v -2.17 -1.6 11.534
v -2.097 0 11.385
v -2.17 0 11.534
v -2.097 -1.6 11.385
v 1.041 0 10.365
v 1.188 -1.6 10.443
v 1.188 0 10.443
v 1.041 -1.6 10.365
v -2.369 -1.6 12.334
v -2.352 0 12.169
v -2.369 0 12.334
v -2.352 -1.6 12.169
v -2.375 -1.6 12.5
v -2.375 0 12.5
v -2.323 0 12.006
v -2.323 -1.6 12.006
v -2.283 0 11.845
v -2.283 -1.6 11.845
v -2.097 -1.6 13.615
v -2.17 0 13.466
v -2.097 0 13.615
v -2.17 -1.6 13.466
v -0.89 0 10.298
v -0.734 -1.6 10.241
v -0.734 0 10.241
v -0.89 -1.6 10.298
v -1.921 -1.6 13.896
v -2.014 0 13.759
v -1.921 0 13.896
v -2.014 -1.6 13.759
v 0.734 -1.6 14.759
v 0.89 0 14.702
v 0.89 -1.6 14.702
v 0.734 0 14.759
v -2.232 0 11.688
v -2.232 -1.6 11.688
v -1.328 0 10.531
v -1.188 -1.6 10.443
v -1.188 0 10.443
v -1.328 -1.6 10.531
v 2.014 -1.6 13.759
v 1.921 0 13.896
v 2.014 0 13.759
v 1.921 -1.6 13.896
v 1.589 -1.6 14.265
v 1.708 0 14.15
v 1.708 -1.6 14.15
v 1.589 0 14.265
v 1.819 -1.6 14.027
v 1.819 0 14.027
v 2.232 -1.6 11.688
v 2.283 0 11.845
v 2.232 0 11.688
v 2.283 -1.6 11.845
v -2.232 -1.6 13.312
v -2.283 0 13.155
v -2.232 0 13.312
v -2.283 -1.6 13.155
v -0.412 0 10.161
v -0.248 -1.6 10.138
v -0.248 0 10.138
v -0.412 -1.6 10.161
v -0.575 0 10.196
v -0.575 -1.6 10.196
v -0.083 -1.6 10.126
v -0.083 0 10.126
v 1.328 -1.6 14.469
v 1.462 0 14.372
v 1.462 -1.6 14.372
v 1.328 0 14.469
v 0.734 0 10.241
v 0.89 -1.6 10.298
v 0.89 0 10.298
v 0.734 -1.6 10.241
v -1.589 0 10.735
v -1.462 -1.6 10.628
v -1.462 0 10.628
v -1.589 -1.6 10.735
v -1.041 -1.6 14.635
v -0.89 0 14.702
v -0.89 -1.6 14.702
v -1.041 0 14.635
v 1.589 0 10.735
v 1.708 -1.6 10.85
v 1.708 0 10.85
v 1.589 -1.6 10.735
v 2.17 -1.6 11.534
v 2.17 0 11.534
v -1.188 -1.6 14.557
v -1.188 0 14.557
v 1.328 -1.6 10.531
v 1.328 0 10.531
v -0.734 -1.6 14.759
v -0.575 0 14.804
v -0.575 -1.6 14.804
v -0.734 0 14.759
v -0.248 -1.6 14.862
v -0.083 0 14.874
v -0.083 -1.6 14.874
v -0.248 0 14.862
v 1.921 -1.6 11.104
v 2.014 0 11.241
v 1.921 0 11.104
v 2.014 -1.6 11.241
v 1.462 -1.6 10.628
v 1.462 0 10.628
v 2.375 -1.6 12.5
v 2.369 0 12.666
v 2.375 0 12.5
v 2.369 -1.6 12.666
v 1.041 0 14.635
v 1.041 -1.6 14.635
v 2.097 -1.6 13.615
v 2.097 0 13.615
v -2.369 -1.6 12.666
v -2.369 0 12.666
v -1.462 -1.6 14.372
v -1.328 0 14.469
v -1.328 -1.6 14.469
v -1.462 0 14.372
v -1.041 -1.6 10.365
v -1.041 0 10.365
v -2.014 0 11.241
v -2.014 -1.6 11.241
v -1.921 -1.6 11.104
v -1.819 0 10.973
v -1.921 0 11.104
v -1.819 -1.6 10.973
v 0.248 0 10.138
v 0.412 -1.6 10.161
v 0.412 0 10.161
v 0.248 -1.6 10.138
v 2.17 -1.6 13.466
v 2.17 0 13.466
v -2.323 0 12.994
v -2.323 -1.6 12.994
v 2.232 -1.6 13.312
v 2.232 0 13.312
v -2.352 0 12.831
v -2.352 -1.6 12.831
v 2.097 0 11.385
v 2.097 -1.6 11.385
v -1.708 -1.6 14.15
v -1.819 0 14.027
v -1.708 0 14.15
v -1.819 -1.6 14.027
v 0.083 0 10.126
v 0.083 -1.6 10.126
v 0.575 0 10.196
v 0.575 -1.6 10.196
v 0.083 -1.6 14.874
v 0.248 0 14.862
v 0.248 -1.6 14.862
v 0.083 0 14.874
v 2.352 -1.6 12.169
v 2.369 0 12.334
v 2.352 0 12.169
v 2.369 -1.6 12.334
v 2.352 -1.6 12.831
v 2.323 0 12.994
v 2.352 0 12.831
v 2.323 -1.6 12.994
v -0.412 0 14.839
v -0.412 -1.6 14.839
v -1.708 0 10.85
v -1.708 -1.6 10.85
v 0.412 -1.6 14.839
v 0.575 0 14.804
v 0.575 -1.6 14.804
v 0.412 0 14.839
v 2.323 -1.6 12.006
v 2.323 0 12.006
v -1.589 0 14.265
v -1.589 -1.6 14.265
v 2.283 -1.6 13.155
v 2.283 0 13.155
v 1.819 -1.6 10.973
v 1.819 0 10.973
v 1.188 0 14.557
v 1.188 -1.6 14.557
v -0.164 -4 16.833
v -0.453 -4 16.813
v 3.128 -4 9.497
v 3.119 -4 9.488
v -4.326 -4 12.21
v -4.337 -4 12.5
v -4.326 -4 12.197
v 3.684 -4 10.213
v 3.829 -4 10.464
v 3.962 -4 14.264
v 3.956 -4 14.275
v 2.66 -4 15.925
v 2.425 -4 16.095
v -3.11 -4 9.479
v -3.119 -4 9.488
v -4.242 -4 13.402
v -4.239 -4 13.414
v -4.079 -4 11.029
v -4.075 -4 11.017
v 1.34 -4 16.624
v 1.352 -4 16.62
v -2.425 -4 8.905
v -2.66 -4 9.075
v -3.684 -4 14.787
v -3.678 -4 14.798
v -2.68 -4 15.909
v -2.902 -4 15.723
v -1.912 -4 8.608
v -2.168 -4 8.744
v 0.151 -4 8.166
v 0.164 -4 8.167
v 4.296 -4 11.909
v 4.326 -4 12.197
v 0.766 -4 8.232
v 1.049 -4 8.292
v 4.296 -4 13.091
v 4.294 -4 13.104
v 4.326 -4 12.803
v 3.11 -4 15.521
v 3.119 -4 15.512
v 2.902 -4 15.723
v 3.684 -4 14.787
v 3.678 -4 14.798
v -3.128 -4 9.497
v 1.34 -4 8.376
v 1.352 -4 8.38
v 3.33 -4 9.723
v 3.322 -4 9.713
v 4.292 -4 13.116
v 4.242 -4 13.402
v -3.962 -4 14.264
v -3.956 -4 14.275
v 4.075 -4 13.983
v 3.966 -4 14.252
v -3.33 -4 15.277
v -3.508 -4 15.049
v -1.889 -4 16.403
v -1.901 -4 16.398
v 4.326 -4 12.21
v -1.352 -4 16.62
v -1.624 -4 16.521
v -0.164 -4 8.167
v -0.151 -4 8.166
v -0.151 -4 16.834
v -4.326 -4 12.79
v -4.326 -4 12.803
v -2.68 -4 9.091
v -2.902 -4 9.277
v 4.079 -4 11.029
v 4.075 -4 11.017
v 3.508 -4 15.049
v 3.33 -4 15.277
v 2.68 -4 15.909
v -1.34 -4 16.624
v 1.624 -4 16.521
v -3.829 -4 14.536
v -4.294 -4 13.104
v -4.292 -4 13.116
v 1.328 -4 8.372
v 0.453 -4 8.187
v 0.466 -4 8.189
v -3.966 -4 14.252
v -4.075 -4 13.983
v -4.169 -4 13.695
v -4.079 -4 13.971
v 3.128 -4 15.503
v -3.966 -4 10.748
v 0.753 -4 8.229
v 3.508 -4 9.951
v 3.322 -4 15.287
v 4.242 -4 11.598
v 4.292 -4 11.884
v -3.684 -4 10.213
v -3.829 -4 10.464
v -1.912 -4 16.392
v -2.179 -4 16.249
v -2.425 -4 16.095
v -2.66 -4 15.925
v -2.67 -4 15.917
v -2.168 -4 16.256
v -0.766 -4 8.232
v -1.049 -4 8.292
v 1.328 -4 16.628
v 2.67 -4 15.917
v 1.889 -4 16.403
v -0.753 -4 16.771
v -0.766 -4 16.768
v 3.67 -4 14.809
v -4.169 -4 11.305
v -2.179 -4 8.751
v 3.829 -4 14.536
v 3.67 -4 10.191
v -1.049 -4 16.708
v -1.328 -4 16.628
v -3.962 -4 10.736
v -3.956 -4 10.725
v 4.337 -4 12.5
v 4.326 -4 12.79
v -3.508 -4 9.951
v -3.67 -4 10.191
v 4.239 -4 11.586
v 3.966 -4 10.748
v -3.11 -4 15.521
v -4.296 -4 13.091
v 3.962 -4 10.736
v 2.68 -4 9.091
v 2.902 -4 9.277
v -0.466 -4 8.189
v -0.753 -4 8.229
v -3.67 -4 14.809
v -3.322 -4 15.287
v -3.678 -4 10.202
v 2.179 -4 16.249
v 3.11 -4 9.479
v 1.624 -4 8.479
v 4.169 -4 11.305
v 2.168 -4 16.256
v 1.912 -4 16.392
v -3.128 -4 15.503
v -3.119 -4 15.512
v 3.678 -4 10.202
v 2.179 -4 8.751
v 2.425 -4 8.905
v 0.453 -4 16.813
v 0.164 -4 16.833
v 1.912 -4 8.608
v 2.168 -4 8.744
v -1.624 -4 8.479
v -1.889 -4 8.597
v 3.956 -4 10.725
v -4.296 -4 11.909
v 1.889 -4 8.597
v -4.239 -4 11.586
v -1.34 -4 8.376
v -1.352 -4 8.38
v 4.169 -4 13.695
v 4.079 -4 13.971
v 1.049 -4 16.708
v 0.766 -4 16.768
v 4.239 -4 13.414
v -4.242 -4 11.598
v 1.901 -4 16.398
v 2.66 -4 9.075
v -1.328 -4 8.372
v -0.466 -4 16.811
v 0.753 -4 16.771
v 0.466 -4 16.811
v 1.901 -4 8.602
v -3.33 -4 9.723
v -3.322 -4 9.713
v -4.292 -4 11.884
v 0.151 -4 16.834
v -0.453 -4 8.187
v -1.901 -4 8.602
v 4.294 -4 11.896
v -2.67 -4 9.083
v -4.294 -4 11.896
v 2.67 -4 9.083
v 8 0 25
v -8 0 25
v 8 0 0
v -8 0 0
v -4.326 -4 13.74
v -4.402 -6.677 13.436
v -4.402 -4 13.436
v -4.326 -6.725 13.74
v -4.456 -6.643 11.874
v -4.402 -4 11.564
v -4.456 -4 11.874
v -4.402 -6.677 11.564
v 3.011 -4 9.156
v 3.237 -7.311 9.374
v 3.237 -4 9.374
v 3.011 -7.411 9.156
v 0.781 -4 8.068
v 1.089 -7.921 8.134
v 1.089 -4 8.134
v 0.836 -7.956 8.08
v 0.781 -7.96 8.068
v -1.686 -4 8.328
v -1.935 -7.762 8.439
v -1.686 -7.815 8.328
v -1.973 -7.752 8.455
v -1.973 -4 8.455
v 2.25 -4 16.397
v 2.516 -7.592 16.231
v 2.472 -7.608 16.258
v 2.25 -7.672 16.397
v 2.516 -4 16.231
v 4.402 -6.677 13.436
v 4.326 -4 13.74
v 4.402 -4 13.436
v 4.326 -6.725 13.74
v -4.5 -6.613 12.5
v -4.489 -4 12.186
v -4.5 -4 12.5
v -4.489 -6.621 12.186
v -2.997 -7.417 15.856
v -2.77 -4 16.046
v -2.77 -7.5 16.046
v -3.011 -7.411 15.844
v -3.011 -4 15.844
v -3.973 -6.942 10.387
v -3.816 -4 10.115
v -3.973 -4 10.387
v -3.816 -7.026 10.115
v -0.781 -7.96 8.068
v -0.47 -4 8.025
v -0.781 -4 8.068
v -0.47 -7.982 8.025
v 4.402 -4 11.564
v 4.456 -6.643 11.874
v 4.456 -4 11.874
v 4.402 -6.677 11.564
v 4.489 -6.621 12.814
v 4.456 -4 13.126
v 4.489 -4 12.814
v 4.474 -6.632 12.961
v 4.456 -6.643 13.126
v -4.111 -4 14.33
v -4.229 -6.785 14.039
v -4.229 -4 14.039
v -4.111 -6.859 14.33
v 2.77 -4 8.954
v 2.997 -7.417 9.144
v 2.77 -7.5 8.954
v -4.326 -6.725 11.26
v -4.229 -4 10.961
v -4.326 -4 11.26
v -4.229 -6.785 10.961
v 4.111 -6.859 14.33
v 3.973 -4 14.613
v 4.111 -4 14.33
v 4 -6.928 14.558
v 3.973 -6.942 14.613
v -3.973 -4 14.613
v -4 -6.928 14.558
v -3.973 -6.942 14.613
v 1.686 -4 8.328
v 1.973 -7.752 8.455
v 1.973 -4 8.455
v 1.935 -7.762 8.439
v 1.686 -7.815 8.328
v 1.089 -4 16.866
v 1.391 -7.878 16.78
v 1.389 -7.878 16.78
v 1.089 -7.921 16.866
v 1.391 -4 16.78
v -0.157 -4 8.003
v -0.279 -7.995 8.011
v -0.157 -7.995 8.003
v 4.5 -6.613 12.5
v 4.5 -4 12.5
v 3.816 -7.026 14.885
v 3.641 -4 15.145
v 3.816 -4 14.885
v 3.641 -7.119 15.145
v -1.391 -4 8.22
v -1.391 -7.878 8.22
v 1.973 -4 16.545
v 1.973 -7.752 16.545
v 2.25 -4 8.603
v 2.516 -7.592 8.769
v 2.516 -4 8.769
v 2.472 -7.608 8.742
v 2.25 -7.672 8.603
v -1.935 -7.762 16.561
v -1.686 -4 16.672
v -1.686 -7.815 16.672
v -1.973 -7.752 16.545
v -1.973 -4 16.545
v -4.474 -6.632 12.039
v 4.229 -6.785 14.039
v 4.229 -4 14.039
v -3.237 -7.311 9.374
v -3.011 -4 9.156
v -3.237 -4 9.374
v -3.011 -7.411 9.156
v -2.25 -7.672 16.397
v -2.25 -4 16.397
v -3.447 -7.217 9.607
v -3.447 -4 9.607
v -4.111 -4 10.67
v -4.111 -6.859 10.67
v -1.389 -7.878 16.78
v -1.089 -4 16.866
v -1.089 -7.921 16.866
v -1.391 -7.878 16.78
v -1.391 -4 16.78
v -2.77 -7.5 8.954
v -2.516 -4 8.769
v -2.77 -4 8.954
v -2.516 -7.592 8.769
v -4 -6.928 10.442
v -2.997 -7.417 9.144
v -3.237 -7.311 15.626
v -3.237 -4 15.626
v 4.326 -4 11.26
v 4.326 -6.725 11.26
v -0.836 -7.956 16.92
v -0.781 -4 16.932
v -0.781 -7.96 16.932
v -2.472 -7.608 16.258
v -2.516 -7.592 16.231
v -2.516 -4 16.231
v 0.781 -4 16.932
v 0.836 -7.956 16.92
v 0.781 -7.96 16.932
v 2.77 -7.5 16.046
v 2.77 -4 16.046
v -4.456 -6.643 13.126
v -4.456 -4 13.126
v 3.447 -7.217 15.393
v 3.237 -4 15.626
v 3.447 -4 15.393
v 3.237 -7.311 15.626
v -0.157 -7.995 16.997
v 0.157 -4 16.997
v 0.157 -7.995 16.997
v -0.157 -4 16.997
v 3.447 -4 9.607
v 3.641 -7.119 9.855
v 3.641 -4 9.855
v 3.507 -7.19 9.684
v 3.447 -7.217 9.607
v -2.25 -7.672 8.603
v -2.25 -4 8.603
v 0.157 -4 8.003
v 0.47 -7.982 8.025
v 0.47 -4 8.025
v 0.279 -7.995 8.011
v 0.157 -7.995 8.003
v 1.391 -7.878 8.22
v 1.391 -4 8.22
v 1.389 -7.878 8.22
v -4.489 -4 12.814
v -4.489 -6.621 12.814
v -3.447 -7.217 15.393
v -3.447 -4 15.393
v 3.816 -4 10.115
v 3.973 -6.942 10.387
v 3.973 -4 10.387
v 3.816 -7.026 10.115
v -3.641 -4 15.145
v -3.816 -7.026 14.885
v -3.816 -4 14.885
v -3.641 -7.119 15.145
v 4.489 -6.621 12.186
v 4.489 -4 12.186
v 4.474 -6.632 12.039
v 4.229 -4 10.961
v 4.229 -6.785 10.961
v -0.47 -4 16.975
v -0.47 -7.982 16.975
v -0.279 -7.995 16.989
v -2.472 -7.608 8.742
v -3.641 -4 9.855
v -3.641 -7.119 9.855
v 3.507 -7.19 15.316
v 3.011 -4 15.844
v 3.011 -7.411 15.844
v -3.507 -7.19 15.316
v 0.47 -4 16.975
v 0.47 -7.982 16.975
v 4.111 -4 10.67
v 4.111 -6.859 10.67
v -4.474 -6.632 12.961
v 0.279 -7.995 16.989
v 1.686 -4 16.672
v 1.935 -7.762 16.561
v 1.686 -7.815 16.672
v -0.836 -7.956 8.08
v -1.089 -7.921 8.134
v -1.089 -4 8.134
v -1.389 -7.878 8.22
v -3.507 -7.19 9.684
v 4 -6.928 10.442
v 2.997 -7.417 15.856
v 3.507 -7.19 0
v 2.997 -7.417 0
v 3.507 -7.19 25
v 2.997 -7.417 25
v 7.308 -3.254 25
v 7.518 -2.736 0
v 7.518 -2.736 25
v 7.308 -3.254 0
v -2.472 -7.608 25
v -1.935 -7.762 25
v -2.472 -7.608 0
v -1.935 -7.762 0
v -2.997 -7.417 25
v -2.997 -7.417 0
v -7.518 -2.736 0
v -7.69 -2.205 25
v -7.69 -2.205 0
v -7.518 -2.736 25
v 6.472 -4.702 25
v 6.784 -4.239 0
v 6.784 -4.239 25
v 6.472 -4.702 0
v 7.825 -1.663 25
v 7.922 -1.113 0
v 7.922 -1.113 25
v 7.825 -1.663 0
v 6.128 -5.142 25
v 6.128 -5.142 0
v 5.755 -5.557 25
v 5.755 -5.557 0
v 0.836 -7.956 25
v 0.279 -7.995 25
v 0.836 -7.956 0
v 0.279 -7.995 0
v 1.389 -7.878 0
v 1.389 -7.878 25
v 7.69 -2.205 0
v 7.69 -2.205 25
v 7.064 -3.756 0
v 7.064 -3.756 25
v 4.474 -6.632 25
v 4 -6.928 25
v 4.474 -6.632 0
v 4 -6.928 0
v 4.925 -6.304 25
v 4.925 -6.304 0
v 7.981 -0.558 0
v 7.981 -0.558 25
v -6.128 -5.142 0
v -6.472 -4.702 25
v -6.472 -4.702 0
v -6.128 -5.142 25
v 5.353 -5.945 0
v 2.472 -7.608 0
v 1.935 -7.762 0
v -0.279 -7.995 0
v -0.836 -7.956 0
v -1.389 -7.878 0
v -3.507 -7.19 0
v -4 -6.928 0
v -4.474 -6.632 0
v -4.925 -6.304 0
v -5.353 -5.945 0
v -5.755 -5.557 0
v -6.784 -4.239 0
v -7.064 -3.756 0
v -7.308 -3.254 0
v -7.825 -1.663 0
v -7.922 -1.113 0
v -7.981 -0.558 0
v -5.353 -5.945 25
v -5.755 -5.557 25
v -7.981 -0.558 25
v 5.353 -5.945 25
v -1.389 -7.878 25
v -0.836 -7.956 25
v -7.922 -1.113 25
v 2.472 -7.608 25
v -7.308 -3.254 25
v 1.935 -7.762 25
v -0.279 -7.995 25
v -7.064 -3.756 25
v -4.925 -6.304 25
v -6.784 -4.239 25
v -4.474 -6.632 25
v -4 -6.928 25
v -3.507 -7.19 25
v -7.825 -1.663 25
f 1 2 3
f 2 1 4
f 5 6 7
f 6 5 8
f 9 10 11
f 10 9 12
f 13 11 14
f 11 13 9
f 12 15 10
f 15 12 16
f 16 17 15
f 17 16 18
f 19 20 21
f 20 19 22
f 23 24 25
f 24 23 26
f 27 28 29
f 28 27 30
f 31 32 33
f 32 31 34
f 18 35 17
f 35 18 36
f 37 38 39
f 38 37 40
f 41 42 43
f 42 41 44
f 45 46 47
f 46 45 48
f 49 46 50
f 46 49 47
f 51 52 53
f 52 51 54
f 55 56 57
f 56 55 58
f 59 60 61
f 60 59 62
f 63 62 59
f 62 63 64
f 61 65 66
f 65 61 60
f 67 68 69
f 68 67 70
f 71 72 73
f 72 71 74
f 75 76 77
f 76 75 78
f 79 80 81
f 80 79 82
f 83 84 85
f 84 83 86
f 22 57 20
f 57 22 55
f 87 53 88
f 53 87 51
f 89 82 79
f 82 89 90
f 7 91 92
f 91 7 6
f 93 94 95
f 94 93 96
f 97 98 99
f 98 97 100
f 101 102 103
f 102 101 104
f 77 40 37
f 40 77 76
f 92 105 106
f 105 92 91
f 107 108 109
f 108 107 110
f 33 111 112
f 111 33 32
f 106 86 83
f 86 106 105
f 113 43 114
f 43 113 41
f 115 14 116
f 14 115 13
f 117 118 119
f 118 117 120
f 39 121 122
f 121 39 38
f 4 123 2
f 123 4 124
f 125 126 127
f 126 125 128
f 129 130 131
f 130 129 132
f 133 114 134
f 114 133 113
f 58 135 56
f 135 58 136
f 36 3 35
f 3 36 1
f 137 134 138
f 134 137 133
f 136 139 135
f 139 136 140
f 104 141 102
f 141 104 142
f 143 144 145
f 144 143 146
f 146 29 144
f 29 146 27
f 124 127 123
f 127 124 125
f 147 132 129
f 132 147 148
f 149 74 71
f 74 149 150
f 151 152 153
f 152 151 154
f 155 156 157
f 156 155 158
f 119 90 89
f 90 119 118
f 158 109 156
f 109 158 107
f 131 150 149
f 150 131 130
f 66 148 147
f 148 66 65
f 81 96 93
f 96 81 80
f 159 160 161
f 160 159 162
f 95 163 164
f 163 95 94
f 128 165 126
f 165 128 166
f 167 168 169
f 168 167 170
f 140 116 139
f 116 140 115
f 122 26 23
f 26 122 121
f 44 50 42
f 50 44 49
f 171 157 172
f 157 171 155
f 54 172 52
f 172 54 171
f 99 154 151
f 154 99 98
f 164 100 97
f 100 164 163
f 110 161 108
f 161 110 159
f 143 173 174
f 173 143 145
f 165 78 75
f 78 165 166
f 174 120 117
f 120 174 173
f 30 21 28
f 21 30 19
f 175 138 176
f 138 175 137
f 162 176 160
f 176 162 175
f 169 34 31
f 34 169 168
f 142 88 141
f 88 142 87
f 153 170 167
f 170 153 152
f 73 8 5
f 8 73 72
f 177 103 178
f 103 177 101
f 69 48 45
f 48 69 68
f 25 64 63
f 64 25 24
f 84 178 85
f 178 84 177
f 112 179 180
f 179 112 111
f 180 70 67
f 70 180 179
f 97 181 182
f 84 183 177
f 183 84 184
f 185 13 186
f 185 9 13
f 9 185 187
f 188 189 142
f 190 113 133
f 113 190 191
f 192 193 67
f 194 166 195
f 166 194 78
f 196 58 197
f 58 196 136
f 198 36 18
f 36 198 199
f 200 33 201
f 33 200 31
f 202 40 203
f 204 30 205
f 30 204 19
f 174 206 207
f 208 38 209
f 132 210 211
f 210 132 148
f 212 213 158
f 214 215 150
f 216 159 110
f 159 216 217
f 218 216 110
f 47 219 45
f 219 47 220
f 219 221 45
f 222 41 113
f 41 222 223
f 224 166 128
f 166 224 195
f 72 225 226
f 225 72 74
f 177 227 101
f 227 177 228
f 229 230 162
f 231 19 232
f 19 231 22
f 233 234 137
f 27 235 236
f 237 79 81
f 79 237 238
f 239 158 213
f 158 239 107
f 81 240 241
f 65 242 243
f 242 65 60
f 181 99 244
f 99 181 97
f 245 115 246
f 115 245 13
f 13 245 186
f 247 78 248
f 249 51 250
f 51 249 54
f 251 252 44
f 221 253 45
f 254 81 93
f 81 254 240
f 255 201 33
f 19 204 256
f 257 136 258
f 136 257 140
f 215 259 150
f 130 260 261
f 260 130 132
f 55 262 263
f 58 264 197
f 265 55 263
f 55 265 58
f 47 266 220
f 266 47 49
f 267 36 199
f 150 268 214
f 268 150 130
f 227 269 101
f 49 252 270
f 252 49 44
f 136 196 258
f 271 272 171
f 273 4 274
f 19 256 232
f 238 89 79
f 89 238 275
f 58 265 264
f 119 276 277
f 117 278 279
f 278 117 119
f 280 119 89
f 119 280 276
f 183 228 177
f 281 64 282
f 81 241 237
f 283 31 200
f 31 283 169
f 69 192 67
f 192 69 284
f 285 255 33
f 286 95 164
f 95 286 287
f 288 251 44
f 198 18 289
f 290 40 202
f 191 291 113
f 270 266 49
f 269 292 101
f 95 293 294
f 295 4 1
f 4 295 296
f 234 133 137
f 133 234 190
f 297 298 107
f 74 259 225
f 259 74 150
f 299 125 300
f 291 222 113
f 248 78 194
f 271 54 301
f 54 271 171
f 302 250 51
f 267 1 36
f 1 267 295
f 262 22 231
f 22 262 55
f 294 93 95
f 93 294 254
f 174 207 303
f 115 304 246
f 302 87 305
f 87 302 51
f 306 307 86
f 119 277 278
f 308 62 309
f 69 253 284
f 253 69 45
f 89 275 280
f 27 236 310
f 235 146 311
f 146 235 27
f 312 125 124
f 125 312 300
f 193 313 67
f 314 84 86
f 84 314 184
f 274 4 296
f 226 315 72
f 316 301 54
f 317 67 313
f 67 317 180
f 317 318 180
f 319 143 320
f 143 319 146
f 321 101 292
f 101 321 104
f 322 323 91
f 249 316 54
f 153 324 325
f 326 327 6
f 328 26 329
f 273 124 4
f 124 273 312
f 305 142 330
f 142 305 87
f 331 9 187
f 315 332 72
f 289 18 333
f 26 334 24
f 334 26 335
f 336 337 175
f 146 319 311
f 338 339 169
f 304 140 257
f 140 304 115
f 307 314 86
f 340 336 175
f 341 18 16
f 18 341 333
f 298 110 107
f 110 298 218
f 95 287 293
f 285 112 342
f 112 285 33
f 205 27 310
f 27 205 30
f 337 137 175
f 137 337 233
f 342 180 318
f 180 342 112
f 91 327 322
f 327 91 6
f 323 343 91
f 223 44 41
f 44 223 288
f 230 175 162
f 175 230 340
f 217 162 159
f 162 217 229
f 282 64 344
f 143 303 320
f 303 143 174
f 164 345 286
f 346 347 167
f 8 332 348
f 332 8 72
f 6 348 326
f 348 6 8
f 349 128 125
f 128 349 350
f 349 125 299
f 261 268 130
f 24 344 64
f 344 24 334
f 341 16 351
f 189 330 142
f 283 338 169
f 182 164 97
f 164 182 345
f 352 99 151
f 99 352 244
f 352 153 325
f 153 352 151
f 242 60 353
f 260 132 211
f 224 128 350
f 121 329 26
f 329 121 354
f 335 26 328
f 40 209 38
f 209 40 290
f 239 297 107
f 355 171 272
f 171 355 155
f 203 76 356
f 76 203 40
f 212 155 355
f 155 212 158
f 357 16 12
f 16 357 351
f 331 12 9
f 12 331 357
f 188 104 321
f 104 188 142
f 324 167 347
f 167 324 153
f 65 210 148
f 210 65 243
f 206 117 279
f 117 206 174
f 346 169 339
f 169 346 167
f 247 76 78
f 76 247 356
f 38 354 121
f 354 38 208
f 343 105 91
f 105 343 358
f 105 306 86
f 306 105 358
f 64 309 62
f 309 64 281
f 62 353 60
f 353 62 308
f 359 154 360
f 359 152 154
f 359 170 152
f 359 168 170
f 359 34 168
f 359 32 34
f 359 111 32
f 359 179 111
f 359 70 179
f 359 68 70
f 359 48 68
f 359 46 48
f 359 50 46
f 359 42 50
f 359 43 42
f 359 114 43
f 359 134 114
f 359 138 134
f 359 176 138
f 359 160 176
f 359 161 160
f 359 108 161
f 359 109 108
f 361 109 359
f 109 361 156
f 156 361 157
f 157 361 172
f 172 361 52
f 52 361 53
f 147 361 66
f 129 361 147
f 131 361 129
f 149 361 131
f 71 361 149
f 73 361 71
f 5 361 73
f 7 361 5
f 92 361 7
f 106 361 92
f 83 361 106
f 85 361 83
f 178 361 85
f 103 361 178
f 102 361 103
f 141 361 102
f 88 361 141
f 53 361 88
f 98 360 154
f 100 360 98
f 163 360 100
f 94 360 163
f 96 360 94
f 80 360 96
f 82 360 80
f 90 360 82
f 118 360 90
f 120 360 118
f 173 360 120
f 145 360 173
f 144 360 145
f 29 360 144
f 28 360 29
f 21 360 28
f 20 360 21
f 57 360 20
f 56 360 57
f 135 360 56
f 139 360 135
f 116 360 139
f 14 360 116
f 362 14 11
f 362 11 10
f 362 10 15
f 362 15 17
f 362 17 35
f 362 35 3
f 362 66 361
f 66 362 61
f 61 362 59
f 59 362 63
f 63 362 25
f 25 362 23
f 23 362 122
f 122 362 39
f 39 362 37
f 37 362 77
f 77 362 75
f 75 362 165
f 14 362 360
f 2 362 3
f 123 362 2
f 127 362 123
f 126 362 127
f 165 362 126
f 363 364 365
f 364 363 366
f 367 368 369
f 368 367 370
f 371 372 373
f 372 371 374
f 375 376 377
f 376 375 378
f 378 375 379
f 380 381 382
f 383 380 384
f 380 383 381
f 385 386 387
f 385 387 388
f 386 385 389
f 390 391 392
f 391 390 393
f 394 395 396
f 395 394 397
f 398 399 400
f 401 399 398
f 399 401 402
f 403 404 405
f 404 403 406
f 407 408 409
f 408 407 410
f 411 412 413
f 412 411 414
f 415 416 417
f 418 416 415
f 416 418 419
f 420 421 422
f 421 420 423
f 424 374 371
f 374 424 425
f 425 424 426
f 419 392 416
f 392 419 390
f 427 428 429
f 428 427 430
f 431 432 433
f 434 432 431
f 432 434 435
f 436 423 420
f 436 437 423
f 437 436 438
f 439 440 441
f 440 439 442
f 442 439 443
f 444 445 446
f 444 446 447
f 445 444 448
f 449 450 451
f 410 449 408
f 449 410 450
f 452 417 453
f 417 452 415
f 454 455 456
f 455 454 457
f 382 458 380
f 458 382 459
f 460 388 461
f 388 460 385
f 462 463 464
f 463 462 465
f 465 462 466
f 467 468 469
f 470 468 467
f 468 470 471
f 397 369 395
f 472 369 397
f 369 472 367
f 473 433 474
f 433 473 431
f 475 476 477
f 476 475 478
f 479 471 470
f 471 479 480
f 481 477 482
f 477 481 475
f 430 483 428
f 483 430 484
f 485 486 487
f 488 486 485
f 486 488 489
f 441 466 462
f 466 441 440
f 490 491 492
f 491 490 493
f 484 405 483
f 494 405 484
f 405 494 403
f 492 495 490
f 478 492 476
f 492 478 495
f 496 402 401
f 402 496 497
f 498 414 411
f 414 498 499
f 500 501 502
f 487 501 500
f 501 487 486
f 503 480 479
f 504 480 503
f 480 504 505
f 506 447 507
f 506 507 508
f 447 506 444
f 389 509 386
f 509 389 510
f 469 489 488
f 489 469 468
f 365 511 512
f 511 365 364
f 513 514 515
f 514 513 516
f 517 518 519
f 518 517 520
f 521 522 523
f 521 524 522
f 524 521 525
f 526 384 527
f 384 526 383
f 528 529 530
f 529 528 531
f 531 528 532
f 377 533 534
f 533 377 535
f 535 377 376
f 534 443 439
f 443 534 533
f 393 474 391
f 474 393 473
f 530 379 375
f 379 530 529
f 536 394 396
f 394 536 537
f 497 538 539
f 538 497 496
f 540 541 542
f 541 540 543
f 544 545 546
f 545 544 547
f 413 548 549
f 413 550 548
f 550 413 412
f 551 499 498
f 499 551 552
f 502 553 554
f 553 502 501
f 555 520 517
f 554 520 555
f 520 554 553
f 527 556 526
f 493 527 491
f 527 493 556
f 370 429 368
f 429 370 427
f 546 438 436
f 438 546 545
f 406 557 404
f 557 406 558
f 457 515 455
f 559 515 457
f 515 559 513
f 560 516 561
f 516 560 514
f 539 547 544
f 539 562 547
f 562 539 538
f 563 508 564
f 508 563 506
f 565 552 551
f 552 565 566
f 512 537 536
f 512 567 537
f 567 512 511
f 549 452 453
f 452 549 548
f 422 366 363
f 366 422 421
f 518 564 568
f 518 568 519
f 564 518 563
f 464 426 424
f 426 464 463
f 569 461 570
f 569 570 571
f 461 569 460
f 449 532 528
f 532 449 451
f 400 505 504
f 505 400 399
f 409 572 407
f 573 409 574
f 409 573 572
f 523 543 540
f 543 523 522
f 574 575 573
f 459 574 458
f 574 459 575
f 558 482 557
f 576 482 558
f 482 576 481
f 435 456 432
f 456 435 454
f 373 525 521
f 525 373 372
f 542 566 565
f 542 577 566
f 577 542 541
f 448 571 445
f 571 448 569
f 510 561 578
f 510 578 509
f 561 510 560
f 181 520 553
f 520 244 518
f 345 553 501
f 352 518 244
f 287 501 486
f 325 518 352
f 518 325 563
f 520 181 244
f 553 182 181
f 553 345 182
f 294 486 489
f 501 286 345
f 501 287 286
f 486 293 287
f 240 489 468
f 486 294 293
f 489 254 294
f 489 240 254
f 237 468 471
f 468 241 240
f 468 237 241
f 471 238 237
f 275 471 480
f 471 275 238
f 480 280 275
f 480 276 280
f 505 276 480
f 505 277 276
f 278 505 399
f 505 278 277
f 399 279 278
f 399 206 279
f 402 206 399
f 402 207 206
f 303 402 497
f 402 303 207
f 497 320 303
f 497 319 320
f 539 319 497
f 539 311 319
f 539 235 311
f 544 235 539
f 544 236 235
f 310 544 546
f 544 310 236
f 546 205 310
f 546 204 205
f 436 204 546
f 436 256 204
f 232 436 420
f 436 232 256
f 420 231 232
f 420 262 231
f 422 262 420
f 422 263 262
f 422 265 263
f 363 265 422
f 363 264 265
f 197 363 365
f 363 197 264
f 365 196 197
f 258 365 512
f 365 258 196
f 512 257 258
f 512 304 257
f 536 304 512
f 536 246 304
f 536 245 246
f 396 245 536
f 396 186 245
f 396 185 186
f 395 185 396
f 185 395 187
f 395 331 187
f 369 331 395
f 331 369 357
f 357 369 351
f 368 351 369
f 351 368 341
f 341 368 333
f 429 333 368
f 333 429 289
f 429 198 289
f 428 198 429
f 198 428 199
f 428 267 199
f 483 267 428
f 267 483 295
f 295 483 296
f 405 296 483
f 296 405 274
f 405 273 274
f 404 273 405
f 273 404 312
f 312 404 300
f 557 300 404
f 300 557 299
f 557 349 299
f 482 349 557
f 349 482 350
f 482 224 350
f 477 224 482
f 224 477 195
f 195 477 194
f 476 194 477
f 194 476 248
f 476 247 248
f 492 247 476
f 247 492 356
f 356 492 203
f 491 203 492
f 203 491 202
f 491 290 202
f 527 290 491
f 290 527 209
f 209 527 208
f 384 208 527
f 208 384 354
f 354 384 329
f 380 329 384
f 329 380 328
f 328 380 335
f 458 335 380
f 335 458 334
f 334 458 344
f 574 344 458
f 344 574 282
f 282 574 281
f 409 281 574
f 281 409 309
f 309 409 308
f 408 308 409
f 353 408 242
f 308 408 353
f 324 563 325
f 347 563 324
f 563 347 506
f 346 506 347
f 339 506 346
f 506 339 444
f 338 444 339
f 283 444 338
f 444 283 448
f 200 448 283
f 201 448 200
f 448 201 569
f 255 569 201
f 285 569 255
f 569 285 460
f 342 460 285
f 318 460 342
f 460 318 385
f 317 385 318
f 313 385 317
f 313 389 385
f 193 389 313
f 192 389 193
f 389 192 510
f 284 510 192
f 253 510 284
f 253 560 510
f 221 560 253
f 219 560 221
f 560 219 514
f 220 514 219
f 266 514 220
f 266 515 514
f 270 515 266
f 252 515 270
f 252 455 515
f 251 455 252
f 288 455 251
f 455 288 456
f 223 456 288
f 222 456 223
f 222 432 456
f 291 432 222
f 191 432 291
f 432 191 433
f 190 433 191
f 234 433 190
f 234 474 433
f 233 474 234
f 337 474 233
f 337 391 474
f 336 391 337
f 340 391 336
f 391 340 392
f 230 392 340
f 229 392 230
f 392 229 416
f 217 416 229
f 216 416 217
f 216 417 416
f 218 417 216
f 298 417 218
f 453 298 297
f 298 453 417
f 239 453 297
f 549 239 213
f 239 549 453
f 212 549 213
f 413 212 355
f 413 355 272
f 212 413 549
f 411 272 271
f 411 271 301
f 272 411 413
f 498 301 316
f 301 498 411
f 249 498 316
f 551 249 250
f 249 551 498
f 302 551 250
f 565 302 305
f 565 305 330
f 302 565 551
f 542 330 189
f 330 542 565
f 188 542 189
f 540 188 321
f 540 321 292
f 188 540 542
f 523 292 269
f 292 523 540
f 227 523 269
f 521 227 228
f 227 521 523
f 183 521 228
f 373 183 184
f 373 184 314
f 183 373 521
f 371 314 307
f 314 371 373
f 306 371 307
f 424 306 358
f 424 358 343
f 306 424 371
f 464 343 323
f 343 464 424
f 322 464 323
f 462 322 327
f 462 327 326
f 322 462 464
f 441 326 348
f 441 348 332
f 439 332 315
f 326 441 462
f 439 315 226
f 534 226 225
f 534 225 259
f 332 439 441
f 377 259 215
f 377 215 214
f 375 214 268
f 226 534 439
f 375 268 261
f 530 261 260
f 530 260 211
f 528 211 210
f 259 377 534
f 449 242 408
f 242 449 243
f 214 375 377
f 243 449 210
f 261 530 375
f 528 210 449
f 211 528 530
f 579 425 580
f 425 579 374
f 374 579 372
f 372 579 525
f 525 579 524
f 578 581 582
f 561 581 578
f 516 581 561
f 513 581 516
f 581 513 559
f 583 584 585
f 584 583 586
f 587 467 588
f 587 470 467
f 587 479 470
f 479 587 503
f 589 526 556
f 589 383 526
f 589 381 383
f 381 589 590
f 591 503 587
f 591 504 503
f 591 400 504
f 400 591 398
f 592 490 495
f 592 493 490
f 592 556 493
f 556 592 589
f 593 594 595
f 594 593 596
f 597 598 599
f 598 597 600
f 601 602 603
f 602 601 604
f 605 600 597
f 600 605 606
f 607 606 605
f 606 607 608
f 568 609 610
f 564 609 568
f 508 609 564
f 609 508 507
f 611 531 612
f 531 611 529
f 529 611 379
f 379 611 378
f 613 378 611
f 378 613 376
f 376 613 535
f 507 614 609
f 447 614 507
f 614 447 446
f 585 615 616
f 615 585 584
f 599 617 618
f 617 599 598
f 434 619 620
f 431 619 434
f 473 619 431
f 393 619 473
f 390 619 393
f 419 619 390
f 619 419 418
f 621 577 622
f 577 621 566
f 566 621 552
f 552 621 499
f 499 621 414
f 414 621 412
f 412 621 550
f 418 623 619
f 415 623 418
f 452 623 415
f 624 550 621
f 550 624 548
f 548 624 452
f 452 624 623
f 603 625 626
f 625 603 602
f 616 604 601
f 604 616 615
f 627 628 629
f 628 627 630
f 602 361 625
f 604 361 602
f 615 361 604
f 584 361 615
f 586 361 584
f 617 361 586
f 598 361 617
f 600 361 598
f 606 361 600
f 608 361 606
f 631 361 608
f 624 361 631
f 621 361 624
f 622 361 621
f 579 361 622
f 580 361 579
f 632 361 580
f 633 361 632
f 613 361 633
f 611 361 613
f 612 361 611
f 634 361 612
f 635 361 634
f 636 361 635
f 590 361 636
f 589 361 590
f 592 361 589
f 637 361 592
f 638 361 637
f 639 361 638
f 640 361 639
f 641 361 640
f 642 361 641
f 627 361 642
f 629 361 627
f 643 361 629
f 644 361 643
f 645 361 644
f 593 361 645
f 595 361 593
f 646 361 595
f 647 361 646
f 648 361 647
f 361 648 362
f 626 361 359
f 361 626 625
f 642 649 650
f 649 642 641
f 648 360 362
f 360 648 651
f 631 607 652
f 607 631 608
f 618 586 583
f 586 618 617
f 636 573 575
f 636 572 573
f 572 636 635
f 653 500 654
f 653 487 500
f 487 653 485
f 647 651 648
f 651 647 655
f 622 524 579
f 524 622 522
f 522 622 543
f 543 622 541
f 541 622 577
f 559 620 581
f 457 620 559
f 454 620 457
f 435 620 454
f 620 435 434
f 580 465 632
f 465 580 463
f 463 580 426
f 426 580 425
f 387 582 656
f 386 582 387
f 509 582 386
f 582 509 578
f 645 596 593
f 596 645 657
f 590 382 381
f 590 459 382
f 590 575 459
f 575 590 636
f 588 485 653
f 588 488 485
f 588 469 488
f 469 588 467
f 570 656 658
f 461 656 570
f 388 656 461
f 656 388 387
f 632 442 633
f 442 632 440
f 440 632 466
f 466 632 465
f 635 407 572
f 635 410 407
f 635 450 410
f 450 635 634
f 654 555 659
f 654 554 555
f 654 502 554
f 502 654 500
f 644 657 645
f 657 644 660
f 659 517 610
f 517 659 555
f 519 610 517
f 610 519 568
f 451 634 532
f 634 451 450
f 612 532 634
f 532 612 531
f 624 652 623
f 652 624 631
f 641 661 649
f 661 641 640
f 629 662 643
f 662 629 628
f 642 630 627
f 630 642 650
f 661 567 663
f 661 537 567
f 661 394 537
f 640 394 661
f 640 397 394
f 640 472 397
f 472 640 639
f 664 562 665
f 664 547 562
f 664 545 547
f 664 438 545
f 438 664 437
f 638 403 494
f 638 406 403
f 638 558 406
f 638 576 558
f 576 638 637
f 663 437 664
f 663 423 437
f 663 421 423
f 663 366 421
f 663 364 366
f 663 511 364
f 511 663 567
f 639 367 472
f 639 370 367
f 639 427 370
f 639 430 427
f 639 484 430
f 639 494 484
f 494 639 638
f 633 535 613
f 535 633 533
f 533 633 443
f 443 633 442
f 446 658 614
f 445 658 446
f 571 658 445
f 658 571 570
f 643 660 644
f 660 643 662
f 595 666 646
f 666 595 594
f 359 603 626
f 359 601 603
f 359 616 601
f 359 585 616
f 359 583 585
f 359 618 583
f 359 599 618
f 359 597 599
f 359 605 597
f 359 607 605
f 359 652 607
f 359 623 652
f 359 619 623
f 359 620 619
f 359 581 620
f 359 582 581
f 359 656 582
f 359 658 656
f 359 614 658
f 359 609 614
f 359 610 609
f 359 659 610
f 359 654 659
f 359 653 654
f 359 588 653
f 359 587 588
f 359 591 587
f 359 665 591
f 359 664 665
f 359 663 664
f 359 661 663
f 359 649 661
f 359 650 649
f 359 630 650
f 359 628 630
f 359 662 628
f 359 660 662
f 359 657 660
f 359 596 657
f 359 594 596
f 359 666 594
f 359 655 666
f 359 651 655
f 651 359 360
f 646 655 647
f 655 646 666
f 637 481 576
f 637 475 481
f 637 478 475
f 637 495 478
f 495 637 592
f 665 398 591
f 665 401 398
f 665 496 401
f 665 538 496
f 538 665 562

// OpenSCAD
$fa=4; // default minimum facet angle is now 4
$fs=0.05; // default minimum facet size is now 0.05 mm

screwShoulder = 1.2;
screwHeadRad = 3;
screwShaftRad = 1.7;
screwHoleDiam = 4.75;
countersinkDiam = 9;
screwDepth = 8;
screwShoulderDepth = 2.5;

difference() {
  cylinder(r = 8, h = 25);
  union() {
    translate([-8.1, 0, -.1]) cube([16.2, 8.1, 25.2]);
    translate([0, 4, 12.5]) rotate([-90, 0, 180]) chamferedScrewHole(countersinkDiam / 2, screwHoleDiam / 2, screwDepth, screwShoulderDepth);
    translate([0, -4, 12.5]) rotate([-90, 0, 180]) cylinder(r = countersinkDiam / 2, h=8);
  }
}


module chamferedScrewHole(rh, rs, d, ds, t = .1) {
  translate([0, 0, -t]) cylinder(r=rs, h=d + t);
  translate([0, 0, d - ds + t]) cylinder(r1=rs, r2=rh, h=ds + t);
}
